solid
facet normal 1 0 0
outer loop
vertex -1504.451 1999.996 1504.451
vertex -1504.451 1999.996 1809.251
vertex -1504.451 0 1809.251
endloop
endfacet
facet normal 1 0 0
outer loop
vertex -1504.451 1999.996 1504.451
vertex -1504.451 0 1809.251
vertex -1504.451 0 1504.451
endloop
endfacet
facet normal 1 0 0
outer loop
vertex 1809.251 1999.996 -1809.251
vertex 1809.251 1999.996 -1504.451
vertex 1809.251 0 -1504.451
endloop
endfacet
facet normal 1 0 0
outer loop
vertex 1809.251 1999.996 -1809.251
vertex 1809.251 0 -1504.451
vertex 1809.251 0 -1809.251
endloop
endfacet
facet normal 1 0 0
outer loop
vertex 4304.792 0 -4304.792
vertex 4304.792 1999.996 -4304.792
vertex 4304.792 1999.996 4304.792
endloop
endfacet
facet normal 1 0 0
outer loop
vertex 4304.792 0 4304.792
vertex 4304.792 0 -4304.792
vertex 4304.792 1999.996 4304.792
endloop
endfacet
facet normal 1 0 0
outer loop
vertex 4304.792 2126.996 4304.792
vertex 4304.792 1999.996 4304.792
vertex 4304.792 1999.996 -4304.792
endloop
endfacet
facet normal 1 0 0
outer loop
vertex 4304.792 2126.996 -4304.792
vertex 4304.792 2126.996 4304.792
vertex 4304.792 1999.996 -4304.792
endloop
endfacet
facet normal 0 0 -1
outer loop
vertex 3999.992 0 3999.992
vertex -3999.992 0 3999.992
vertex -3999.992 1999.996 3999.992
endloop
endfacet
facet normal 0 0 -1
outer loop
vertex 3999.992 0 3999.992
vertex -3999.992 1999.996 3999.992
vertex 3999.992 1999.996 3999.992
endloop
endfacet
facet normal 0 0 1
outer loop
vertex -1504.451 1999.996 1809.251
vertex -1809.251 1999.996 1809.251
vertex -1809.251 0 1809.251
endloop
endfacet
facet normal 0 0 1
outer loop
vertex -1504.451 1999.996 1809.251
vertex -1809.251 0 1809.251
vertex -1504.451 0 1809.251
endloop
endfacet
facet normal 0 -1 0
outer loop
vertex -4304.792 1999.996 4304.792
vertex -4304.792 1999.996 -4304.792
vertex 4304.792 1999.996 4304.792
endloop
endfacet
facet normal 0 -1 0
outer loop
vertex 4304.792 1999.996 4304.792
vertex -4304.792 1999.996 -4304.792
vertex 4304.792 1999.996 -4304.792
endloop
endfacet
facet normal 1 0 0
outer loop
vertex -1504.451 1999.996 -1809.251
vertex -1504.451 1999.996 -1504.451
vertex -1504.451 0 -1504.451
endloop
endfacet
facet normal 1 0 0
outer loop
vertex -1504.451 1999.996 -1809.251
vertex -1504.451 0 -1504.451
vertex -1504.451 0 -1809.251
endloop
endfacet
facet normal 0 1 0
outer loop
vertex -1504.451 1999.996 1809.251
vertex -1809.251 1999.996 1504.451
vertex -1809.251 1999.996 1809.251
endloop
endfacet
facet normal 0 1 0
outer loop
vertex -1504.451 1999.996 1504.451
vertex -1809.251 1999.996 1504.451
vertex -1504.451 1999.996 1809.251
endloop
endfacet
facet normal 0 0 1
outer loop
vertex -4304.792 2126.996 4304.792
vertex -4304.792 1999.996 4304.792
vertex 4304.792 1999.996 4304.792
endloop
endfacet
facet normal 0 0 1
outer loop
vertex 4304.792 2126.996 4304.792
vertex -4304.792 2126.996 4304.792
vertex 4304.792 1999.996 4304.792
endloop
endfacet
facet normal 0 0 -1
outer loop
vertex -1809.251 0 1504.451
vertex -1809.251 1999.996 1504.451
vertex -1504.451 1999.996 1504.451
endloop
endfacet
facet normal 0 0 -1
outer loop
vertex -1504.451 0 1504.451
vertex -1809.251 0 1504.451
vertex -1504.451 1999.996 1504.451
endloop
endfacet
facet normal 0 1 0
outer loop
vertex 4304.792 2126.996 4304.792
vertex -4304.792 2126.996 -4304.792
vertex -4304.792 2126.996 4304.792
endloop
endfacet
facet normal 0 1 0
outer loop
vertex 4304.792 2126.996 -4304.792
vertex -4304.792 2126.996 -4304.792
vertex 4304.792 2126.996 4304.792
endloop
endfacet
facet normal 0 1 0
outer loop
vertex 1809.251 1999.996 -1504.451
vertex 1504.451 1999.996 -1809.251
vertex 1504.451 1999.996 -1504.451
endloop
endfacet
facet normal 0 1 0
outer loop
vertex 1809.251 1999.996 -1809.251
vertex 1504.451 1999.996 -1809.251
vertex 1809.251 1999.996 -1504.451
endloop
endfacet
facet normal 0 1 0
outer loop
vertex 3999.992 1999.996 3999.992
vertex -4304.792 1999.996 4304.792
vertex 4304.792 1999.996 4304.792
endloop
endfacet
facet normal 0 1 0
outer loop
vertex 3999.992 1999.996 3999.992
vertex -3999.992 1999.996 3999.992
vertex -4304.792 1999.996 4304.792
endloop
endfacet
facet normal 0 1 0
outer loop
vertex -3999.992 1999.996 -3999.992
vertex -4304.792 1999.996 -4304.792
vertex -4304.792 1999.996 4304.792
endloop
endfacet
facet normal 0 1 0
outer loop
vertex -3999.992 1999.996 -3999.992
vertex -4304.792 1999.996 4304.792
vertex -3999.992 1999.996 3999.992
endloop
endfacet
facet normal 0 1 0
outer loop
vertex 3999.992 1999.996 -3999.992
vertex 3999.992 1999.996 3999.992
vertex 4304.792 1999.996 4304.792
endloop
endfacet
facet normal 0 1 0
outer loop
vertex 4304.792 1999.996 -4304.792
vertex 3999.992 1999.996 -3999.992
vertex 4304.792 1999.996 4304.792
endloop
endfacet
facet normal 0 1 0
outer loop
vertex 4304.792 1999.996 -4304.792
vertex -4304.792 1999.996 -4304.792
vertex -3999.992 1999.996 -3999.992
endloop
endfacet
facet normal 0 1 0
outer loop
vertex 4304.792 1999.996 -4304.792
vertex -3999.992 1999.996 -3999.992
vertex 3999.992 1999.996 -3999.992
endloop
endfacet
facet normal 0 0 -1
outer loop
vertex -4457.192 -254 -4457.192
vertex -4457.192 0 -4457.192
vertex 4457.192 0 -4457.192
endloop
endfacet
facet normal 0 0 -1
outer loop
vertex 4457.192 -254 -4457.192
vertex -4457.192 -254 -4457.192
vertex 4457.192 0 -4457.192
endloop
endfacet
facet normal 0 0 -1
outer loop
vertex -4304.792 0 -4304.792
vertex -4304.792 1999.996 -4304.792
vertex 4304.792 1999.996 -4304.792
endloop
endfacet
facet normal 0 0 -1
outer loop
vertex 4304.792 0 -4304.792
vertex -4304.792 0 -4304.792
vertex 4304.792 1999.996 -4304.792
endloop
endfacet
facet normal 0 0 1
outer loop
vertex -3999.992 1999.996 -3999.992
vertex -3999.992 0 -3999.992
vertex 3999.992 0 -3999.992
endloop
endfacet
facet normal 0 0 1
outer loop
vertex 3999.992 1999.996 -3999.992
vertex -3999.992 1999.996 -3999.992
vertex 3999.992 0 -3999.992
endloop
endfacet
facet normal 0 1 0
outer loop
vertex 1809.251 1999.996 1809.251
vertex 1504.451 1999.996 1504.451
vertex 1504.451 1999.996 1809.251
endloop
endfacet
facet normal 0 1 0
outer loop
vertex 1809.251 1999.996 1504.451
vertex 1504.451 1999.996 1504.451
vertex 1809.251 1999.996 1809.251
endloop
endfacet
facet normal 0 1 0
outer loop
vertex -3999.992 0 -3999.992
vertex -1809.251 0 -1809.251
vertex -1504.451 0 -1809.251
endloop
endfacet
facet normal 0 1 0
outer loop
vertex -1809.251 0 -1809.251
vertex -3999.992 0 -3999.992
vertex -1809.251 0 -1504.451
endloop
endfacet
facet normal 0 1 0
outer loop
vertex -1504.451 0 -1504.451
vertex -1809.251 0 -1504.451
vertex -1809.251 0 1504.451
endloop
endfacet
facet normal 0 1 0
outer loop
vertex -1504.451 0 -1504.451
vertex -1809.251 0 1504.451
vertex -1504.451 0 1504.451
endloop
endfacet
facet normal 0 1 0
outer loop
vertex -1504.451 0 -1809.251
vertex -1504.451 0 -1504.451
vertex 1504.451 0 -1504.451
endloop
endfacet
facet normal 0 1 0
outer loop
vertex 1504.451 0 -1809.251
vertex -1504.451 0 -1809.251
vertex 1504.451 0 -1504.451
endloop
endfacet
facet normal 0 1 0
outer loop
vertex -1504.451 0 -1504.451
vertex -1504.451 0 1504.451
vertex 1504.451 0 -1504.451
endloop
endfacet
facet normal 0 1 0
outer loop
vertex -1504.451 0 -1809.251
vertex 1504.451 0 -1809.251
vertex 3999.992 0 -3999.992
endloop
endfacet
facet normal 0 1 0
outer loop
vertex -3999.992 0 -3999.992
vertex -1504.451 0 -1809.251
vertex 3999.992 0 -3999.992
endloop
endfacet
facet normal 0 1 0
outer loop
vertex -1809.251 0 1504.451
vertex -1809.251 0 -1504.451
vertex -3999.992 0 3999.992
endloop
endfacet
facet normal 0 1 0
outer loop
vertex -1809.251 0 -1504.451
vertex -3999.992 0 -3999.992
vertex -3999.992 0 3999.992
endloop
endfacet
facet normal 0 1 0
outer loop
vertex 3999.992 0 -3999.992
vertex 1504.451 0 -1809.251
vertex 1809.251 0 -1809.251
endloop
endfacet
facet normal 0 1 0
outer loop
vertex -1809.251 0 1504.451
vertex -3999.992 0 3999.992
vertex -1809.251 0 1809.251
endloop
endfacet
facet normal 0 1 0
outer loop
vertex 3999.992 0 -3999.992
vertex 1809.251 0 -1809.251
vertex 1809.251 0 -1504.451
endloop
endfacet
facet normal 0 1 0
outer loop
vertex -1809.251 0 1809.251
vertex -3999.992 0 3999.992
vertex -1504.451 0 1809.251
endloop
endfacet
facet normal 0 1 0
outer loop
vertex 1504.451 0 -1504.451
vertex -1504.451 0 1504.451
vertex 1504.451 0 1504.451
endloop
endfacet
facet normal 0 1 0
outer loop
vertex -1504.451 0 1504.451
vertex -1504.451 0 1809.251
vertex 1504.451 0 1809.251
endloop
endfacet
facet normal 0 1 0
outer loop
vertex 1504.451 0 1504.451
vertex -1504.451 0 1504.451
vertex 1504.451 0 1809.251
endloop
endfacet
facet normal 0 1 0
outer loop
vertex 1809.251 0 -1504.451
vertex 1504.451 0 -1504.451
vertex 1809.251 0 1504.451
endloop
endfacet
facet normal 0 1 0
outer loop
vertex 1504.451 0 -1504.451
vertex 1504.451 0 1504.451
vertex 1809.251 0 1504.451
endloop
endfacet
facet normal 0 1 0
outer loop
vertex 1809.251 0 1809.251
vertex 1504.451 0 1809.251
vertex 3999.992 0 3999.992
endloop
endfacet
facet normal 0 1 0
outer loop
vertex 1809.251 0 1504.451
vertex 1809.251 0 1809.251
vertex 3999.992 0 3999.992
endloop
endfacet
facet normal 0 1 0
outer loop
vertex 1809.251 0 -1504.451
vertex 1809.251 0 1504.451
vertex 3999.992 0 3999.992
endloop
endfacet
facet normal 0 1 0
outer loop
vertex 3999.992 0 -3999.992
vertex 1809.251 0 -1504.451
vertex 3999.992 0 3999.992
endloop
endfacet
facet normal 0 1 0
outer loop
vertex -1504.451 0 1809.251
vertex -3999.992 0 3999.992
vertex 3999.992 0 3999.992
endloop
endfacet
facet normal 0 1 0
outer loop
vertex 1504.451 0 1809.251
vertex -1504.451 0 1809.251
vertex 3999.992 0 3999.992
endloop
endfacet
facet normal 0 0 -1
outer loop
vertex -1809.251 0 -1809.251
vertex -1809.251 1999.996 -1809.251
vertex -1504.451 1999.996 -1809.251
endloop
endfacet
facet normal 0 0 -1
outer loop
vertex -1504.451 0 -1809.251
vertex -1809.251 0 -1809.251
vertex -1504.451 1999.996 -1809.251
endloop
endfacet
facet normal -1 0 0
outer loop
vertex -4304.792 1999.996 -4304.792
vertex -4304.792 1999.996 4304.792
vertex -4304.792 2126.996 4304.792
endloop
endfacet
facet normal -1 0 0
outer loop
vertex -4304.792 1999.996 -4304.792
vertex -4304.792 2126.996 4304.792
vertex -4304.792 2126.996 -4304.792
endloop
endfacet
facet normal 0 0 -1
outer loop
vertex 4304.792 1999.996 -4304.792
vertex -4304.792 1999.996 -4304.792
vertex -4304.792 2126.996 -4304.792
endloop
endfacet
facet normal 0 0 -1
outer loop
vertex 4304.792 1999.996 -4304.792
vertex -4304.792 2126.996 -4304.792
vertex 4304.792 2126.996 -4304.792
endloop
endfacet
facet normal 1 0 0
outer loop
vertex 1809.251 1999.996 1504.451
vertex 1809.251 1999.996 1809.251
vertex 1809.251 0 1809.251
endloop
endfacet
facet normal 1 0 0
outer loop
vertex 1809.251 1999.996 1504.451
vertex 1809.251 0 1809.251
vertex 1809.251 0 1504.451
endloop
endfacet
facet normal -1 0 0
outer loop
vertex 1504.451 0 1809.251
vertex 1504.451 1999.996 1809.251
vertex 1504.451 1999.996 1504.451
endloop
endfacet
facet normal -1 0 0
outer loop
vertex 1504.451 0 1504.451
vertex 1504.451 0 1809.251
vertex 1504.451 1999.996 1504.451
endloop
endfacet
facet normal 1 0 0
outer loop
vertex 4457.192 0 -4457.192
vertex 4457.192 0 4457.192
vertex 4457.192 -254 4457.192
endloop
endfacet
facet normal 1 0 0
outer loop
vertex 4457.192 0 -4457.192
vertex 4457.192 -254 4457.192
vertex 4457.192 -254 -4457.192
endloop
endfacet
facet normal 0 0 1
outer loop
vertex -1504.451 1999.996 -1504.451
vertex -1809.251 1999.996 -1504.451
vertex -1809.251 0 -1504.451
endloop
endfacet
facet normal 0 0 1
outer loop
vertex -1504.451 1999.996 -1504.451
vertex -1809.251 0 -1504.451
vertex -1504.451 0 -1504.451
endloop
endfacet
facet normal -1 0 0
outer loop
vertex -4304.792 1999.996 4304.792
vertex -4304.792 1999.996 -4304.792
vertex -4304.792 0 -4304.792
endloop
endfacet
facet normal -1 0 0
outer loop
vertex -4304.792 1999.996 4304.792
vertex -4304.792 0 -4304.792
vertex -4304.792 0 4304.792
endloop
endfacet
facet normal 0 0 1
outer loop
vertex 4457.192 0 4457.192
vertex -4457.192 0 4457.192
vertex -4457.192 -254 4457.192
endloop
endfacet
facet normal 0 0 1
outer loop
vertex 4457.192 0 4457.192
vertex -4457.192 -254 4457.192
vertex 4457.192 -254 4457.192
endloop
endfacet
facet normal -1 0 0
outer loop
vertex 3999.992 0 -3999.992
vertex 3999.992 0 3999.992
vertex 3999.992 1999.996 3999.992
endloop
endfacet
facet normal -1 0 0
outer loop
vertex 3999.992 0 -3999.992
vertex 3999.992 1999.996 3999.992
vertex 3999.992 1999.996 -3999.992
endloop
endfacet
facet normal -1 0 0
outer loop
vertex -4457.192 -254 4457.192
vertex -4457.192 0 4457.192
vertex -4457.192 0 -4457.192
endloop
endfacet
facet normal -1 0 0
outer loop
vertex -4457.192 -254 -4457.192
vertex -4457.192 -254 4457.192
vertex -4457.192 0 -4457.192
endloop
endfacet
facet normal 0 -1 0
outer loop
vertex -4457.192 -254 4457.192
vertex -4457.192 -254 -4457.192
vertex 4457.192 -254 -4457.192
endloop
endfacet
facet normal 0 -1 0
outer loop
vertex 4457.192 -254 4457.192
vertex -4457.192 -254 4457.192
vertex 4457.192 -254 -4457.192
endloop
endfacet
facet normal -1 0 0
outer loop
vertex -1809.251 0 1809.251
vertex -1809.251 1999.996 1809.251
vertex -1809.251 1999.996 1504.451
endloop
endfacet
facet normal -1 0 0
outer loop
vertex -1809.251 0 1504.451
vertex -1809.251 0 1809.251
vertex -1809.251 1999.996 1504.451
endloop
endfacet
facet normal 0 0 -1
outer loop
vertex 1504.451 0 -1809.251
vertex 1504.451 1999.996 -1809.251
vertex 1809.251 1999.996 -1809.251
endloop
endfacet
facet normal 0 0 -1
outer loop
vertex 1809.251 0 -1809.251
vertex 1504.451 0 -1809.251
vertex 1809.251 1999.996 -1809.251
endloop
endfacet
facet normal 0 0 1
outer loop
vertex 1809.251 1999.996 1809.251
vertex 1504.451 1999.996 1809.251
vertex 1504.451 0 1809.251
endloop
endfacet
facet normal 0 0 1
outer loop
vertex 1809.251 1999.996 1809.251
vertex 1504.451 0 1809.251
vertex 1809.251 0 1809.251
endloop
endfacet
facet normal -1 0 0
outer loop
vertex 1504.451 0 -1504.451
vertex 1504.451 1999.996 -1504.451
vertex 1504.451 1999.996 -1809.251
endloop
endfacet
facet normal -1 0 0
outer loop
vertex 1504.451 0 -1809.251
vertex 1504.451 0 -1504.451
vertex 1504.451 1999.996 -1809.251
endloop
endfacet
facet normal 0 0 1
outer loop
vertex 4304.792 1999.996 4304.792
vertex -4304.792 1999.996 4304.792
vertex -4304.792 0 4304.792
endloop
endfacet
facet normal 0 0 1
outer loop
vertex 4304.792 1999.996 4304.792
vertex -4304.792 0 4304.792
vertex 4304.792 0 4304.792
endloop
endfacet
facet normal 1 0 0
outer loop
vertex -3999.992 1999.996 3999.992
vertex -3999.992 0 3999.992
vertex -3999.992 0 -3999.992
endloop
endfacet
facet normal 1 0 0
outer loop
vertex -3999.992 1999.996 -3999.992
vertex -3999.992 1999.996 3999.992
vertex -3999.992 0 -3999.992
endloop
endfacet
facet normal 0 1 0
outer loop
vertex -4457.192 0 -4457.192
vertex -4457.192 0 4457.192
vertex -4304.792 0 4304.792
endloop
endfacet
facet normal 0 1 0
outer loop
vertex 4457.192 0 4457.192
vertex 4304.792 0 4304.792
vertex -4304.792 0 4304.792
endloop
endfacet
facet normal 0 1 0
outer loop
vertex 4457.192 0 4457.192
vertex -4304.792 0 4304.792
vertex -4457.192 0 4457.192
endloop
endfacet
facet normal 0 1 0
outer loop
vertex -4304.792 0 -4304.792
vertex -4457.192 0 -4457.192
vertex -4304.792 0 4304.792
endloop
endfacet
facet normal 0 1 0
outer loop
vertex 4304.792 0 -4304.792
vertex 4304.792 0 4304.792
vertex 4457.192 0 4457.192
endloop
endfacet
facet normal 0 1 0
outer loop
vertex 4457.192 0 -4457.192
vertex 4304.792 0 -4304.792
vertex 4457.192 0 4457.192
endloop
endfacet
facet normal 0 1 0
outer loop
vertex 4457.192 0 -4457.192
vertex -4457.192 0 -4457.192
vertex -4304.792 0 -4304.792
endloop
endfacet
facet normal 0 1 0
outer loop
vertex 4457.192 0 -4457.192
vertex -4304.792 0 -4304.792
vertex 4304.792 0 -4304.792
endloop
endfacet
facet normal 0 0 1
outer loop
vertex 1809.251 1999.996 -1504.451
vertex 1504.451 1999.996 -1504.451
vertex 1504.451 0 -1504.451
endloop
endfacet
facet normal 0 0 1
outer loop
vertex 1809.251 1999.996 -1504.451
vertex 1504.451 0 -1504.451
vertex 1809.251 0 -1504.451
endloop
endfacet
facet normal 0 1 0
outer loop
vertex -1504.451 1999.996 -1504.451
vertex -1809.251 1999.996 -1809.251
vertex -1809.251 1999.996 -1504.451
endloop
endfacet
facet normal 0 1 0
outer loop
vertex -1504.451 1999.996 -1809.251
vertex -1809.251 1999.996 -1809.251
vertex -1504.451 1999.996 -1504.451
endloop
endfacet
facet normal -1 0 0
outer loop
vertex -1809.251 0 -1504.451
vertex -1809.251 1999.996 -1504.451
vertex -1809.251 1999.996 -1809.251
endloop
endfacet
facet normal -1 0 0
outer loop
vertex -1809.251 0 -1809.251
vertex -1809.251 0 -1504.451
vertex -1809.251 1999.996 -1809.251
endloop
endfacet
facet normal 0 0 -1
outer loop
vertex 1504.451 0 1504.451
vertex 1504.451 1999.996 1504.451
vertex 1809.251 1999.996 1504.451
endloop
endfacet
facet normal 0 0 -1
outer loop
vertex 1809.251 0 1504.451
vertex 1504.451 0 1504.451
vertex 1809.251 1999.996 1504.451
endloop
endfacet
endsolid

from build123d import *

# Parameters (mm, degrees)
SKETCH2_W           = 8609.584
SKETCH2_H           = 8609.584
SKETCH2_W_2         = 7999.984
SKETCH2_H_2         = 7999.984
BOSS_EXTRUDE1_DEPTH = 1999.996
SKETCH3_W           = 8609.584
SKETCH3_H           = 8609.584
BOSS_EXTRUDE2_DEPTH = 152.4
SKETCH6_W           = 304.8
SKETCH6_H           = 304.8
BOSS_EXTRUDE5_DEPTH = 1999.996
SKETCH7_W           = 8609.584
SKETCH7_H           = 8609.584
BOSS_EXTRUDE6_DEPTH = 127
SKETCH14_W          = 8914.384
SKETCH14_H          = 8914.384
BOSS_EXTRUDE7_DEPTH = 254


with BuildPart() as part:
    # Sketch2 → Boss-Extrude1 (new body)
    with BuildSketch(Plane(origin=(0, 0, 0), x_dir=(1, 0, 0), z_dir=(0, 1, 0))):
        Rectangle(SKETCH2_W, SKETCH2_H)
        Rectangle(SKETCH2_W_2, SKETCH2_H_2, mode=Mode.SUBTRACT)
    extrude(amount=BOSS_EXTRUDE1_DEPTH)

    # Sketch3 → Boss-Extrude2 (add)
    with BuildSketch(Plane.XZ):
        Rectangle(SKETCH3_W, SKETCH3_H)
    extrude(amount=BOSS_EXTRUDE2_DEPTH)

    # Sketch6 → Boss-Extrude5 (add)
    with BuildSketch(Plane(origin=(0, 0, 0), x_dir=(1, 0, 0), z_dir=(0, 1, 0))):
        with Locations((1656.850935784, 1656.850935784)):
            Rectangle(SKETCH6_W, SKETCH6_H)
        with Locations((-1656.850935784, 1656.850935784)):
            Rectangle(SKETCH6_W, SKETCH6_H)
        with Locations((1656.850935784, -1656.850935784)):
            Rectangle(SKETCH6_W, SKETCH6_H)
        with Locations((-1656.850935784, -1656.850935784)):
            Rectangle(SKETCH6_W, SKETCH6_H)
    extrude(amount=BOSS_EXTRUDE5_DEPTH)

    # Sketch14 → Boss-Extrude7 (add)
    with BuildSketch(Plane(origin=(0, 0, 0), x_dir=(1, 0, 0), z_dir=(0, 1, 0))):
        Rectangle(SKETCH14_W, SKETCH14_H)
    extrude(amount=-BOSS_EXTRUDE7_DEPTH)


with BuildPart() as body_2:
    # Sketch7 → Boss-Extrude6 (new body)
    with BuildSketch(Plane(origin=(0, 1999.996, 0), x_dir=(1, 0, 0), z_dir=(0, 1, 0))):
        Rectangle(SKETCH7_W, SKETCH7_H)
    extrude(amount=BOSS_EXTRUDE6_DEPTH)


solid = Compound([part.part, body_2.part])
